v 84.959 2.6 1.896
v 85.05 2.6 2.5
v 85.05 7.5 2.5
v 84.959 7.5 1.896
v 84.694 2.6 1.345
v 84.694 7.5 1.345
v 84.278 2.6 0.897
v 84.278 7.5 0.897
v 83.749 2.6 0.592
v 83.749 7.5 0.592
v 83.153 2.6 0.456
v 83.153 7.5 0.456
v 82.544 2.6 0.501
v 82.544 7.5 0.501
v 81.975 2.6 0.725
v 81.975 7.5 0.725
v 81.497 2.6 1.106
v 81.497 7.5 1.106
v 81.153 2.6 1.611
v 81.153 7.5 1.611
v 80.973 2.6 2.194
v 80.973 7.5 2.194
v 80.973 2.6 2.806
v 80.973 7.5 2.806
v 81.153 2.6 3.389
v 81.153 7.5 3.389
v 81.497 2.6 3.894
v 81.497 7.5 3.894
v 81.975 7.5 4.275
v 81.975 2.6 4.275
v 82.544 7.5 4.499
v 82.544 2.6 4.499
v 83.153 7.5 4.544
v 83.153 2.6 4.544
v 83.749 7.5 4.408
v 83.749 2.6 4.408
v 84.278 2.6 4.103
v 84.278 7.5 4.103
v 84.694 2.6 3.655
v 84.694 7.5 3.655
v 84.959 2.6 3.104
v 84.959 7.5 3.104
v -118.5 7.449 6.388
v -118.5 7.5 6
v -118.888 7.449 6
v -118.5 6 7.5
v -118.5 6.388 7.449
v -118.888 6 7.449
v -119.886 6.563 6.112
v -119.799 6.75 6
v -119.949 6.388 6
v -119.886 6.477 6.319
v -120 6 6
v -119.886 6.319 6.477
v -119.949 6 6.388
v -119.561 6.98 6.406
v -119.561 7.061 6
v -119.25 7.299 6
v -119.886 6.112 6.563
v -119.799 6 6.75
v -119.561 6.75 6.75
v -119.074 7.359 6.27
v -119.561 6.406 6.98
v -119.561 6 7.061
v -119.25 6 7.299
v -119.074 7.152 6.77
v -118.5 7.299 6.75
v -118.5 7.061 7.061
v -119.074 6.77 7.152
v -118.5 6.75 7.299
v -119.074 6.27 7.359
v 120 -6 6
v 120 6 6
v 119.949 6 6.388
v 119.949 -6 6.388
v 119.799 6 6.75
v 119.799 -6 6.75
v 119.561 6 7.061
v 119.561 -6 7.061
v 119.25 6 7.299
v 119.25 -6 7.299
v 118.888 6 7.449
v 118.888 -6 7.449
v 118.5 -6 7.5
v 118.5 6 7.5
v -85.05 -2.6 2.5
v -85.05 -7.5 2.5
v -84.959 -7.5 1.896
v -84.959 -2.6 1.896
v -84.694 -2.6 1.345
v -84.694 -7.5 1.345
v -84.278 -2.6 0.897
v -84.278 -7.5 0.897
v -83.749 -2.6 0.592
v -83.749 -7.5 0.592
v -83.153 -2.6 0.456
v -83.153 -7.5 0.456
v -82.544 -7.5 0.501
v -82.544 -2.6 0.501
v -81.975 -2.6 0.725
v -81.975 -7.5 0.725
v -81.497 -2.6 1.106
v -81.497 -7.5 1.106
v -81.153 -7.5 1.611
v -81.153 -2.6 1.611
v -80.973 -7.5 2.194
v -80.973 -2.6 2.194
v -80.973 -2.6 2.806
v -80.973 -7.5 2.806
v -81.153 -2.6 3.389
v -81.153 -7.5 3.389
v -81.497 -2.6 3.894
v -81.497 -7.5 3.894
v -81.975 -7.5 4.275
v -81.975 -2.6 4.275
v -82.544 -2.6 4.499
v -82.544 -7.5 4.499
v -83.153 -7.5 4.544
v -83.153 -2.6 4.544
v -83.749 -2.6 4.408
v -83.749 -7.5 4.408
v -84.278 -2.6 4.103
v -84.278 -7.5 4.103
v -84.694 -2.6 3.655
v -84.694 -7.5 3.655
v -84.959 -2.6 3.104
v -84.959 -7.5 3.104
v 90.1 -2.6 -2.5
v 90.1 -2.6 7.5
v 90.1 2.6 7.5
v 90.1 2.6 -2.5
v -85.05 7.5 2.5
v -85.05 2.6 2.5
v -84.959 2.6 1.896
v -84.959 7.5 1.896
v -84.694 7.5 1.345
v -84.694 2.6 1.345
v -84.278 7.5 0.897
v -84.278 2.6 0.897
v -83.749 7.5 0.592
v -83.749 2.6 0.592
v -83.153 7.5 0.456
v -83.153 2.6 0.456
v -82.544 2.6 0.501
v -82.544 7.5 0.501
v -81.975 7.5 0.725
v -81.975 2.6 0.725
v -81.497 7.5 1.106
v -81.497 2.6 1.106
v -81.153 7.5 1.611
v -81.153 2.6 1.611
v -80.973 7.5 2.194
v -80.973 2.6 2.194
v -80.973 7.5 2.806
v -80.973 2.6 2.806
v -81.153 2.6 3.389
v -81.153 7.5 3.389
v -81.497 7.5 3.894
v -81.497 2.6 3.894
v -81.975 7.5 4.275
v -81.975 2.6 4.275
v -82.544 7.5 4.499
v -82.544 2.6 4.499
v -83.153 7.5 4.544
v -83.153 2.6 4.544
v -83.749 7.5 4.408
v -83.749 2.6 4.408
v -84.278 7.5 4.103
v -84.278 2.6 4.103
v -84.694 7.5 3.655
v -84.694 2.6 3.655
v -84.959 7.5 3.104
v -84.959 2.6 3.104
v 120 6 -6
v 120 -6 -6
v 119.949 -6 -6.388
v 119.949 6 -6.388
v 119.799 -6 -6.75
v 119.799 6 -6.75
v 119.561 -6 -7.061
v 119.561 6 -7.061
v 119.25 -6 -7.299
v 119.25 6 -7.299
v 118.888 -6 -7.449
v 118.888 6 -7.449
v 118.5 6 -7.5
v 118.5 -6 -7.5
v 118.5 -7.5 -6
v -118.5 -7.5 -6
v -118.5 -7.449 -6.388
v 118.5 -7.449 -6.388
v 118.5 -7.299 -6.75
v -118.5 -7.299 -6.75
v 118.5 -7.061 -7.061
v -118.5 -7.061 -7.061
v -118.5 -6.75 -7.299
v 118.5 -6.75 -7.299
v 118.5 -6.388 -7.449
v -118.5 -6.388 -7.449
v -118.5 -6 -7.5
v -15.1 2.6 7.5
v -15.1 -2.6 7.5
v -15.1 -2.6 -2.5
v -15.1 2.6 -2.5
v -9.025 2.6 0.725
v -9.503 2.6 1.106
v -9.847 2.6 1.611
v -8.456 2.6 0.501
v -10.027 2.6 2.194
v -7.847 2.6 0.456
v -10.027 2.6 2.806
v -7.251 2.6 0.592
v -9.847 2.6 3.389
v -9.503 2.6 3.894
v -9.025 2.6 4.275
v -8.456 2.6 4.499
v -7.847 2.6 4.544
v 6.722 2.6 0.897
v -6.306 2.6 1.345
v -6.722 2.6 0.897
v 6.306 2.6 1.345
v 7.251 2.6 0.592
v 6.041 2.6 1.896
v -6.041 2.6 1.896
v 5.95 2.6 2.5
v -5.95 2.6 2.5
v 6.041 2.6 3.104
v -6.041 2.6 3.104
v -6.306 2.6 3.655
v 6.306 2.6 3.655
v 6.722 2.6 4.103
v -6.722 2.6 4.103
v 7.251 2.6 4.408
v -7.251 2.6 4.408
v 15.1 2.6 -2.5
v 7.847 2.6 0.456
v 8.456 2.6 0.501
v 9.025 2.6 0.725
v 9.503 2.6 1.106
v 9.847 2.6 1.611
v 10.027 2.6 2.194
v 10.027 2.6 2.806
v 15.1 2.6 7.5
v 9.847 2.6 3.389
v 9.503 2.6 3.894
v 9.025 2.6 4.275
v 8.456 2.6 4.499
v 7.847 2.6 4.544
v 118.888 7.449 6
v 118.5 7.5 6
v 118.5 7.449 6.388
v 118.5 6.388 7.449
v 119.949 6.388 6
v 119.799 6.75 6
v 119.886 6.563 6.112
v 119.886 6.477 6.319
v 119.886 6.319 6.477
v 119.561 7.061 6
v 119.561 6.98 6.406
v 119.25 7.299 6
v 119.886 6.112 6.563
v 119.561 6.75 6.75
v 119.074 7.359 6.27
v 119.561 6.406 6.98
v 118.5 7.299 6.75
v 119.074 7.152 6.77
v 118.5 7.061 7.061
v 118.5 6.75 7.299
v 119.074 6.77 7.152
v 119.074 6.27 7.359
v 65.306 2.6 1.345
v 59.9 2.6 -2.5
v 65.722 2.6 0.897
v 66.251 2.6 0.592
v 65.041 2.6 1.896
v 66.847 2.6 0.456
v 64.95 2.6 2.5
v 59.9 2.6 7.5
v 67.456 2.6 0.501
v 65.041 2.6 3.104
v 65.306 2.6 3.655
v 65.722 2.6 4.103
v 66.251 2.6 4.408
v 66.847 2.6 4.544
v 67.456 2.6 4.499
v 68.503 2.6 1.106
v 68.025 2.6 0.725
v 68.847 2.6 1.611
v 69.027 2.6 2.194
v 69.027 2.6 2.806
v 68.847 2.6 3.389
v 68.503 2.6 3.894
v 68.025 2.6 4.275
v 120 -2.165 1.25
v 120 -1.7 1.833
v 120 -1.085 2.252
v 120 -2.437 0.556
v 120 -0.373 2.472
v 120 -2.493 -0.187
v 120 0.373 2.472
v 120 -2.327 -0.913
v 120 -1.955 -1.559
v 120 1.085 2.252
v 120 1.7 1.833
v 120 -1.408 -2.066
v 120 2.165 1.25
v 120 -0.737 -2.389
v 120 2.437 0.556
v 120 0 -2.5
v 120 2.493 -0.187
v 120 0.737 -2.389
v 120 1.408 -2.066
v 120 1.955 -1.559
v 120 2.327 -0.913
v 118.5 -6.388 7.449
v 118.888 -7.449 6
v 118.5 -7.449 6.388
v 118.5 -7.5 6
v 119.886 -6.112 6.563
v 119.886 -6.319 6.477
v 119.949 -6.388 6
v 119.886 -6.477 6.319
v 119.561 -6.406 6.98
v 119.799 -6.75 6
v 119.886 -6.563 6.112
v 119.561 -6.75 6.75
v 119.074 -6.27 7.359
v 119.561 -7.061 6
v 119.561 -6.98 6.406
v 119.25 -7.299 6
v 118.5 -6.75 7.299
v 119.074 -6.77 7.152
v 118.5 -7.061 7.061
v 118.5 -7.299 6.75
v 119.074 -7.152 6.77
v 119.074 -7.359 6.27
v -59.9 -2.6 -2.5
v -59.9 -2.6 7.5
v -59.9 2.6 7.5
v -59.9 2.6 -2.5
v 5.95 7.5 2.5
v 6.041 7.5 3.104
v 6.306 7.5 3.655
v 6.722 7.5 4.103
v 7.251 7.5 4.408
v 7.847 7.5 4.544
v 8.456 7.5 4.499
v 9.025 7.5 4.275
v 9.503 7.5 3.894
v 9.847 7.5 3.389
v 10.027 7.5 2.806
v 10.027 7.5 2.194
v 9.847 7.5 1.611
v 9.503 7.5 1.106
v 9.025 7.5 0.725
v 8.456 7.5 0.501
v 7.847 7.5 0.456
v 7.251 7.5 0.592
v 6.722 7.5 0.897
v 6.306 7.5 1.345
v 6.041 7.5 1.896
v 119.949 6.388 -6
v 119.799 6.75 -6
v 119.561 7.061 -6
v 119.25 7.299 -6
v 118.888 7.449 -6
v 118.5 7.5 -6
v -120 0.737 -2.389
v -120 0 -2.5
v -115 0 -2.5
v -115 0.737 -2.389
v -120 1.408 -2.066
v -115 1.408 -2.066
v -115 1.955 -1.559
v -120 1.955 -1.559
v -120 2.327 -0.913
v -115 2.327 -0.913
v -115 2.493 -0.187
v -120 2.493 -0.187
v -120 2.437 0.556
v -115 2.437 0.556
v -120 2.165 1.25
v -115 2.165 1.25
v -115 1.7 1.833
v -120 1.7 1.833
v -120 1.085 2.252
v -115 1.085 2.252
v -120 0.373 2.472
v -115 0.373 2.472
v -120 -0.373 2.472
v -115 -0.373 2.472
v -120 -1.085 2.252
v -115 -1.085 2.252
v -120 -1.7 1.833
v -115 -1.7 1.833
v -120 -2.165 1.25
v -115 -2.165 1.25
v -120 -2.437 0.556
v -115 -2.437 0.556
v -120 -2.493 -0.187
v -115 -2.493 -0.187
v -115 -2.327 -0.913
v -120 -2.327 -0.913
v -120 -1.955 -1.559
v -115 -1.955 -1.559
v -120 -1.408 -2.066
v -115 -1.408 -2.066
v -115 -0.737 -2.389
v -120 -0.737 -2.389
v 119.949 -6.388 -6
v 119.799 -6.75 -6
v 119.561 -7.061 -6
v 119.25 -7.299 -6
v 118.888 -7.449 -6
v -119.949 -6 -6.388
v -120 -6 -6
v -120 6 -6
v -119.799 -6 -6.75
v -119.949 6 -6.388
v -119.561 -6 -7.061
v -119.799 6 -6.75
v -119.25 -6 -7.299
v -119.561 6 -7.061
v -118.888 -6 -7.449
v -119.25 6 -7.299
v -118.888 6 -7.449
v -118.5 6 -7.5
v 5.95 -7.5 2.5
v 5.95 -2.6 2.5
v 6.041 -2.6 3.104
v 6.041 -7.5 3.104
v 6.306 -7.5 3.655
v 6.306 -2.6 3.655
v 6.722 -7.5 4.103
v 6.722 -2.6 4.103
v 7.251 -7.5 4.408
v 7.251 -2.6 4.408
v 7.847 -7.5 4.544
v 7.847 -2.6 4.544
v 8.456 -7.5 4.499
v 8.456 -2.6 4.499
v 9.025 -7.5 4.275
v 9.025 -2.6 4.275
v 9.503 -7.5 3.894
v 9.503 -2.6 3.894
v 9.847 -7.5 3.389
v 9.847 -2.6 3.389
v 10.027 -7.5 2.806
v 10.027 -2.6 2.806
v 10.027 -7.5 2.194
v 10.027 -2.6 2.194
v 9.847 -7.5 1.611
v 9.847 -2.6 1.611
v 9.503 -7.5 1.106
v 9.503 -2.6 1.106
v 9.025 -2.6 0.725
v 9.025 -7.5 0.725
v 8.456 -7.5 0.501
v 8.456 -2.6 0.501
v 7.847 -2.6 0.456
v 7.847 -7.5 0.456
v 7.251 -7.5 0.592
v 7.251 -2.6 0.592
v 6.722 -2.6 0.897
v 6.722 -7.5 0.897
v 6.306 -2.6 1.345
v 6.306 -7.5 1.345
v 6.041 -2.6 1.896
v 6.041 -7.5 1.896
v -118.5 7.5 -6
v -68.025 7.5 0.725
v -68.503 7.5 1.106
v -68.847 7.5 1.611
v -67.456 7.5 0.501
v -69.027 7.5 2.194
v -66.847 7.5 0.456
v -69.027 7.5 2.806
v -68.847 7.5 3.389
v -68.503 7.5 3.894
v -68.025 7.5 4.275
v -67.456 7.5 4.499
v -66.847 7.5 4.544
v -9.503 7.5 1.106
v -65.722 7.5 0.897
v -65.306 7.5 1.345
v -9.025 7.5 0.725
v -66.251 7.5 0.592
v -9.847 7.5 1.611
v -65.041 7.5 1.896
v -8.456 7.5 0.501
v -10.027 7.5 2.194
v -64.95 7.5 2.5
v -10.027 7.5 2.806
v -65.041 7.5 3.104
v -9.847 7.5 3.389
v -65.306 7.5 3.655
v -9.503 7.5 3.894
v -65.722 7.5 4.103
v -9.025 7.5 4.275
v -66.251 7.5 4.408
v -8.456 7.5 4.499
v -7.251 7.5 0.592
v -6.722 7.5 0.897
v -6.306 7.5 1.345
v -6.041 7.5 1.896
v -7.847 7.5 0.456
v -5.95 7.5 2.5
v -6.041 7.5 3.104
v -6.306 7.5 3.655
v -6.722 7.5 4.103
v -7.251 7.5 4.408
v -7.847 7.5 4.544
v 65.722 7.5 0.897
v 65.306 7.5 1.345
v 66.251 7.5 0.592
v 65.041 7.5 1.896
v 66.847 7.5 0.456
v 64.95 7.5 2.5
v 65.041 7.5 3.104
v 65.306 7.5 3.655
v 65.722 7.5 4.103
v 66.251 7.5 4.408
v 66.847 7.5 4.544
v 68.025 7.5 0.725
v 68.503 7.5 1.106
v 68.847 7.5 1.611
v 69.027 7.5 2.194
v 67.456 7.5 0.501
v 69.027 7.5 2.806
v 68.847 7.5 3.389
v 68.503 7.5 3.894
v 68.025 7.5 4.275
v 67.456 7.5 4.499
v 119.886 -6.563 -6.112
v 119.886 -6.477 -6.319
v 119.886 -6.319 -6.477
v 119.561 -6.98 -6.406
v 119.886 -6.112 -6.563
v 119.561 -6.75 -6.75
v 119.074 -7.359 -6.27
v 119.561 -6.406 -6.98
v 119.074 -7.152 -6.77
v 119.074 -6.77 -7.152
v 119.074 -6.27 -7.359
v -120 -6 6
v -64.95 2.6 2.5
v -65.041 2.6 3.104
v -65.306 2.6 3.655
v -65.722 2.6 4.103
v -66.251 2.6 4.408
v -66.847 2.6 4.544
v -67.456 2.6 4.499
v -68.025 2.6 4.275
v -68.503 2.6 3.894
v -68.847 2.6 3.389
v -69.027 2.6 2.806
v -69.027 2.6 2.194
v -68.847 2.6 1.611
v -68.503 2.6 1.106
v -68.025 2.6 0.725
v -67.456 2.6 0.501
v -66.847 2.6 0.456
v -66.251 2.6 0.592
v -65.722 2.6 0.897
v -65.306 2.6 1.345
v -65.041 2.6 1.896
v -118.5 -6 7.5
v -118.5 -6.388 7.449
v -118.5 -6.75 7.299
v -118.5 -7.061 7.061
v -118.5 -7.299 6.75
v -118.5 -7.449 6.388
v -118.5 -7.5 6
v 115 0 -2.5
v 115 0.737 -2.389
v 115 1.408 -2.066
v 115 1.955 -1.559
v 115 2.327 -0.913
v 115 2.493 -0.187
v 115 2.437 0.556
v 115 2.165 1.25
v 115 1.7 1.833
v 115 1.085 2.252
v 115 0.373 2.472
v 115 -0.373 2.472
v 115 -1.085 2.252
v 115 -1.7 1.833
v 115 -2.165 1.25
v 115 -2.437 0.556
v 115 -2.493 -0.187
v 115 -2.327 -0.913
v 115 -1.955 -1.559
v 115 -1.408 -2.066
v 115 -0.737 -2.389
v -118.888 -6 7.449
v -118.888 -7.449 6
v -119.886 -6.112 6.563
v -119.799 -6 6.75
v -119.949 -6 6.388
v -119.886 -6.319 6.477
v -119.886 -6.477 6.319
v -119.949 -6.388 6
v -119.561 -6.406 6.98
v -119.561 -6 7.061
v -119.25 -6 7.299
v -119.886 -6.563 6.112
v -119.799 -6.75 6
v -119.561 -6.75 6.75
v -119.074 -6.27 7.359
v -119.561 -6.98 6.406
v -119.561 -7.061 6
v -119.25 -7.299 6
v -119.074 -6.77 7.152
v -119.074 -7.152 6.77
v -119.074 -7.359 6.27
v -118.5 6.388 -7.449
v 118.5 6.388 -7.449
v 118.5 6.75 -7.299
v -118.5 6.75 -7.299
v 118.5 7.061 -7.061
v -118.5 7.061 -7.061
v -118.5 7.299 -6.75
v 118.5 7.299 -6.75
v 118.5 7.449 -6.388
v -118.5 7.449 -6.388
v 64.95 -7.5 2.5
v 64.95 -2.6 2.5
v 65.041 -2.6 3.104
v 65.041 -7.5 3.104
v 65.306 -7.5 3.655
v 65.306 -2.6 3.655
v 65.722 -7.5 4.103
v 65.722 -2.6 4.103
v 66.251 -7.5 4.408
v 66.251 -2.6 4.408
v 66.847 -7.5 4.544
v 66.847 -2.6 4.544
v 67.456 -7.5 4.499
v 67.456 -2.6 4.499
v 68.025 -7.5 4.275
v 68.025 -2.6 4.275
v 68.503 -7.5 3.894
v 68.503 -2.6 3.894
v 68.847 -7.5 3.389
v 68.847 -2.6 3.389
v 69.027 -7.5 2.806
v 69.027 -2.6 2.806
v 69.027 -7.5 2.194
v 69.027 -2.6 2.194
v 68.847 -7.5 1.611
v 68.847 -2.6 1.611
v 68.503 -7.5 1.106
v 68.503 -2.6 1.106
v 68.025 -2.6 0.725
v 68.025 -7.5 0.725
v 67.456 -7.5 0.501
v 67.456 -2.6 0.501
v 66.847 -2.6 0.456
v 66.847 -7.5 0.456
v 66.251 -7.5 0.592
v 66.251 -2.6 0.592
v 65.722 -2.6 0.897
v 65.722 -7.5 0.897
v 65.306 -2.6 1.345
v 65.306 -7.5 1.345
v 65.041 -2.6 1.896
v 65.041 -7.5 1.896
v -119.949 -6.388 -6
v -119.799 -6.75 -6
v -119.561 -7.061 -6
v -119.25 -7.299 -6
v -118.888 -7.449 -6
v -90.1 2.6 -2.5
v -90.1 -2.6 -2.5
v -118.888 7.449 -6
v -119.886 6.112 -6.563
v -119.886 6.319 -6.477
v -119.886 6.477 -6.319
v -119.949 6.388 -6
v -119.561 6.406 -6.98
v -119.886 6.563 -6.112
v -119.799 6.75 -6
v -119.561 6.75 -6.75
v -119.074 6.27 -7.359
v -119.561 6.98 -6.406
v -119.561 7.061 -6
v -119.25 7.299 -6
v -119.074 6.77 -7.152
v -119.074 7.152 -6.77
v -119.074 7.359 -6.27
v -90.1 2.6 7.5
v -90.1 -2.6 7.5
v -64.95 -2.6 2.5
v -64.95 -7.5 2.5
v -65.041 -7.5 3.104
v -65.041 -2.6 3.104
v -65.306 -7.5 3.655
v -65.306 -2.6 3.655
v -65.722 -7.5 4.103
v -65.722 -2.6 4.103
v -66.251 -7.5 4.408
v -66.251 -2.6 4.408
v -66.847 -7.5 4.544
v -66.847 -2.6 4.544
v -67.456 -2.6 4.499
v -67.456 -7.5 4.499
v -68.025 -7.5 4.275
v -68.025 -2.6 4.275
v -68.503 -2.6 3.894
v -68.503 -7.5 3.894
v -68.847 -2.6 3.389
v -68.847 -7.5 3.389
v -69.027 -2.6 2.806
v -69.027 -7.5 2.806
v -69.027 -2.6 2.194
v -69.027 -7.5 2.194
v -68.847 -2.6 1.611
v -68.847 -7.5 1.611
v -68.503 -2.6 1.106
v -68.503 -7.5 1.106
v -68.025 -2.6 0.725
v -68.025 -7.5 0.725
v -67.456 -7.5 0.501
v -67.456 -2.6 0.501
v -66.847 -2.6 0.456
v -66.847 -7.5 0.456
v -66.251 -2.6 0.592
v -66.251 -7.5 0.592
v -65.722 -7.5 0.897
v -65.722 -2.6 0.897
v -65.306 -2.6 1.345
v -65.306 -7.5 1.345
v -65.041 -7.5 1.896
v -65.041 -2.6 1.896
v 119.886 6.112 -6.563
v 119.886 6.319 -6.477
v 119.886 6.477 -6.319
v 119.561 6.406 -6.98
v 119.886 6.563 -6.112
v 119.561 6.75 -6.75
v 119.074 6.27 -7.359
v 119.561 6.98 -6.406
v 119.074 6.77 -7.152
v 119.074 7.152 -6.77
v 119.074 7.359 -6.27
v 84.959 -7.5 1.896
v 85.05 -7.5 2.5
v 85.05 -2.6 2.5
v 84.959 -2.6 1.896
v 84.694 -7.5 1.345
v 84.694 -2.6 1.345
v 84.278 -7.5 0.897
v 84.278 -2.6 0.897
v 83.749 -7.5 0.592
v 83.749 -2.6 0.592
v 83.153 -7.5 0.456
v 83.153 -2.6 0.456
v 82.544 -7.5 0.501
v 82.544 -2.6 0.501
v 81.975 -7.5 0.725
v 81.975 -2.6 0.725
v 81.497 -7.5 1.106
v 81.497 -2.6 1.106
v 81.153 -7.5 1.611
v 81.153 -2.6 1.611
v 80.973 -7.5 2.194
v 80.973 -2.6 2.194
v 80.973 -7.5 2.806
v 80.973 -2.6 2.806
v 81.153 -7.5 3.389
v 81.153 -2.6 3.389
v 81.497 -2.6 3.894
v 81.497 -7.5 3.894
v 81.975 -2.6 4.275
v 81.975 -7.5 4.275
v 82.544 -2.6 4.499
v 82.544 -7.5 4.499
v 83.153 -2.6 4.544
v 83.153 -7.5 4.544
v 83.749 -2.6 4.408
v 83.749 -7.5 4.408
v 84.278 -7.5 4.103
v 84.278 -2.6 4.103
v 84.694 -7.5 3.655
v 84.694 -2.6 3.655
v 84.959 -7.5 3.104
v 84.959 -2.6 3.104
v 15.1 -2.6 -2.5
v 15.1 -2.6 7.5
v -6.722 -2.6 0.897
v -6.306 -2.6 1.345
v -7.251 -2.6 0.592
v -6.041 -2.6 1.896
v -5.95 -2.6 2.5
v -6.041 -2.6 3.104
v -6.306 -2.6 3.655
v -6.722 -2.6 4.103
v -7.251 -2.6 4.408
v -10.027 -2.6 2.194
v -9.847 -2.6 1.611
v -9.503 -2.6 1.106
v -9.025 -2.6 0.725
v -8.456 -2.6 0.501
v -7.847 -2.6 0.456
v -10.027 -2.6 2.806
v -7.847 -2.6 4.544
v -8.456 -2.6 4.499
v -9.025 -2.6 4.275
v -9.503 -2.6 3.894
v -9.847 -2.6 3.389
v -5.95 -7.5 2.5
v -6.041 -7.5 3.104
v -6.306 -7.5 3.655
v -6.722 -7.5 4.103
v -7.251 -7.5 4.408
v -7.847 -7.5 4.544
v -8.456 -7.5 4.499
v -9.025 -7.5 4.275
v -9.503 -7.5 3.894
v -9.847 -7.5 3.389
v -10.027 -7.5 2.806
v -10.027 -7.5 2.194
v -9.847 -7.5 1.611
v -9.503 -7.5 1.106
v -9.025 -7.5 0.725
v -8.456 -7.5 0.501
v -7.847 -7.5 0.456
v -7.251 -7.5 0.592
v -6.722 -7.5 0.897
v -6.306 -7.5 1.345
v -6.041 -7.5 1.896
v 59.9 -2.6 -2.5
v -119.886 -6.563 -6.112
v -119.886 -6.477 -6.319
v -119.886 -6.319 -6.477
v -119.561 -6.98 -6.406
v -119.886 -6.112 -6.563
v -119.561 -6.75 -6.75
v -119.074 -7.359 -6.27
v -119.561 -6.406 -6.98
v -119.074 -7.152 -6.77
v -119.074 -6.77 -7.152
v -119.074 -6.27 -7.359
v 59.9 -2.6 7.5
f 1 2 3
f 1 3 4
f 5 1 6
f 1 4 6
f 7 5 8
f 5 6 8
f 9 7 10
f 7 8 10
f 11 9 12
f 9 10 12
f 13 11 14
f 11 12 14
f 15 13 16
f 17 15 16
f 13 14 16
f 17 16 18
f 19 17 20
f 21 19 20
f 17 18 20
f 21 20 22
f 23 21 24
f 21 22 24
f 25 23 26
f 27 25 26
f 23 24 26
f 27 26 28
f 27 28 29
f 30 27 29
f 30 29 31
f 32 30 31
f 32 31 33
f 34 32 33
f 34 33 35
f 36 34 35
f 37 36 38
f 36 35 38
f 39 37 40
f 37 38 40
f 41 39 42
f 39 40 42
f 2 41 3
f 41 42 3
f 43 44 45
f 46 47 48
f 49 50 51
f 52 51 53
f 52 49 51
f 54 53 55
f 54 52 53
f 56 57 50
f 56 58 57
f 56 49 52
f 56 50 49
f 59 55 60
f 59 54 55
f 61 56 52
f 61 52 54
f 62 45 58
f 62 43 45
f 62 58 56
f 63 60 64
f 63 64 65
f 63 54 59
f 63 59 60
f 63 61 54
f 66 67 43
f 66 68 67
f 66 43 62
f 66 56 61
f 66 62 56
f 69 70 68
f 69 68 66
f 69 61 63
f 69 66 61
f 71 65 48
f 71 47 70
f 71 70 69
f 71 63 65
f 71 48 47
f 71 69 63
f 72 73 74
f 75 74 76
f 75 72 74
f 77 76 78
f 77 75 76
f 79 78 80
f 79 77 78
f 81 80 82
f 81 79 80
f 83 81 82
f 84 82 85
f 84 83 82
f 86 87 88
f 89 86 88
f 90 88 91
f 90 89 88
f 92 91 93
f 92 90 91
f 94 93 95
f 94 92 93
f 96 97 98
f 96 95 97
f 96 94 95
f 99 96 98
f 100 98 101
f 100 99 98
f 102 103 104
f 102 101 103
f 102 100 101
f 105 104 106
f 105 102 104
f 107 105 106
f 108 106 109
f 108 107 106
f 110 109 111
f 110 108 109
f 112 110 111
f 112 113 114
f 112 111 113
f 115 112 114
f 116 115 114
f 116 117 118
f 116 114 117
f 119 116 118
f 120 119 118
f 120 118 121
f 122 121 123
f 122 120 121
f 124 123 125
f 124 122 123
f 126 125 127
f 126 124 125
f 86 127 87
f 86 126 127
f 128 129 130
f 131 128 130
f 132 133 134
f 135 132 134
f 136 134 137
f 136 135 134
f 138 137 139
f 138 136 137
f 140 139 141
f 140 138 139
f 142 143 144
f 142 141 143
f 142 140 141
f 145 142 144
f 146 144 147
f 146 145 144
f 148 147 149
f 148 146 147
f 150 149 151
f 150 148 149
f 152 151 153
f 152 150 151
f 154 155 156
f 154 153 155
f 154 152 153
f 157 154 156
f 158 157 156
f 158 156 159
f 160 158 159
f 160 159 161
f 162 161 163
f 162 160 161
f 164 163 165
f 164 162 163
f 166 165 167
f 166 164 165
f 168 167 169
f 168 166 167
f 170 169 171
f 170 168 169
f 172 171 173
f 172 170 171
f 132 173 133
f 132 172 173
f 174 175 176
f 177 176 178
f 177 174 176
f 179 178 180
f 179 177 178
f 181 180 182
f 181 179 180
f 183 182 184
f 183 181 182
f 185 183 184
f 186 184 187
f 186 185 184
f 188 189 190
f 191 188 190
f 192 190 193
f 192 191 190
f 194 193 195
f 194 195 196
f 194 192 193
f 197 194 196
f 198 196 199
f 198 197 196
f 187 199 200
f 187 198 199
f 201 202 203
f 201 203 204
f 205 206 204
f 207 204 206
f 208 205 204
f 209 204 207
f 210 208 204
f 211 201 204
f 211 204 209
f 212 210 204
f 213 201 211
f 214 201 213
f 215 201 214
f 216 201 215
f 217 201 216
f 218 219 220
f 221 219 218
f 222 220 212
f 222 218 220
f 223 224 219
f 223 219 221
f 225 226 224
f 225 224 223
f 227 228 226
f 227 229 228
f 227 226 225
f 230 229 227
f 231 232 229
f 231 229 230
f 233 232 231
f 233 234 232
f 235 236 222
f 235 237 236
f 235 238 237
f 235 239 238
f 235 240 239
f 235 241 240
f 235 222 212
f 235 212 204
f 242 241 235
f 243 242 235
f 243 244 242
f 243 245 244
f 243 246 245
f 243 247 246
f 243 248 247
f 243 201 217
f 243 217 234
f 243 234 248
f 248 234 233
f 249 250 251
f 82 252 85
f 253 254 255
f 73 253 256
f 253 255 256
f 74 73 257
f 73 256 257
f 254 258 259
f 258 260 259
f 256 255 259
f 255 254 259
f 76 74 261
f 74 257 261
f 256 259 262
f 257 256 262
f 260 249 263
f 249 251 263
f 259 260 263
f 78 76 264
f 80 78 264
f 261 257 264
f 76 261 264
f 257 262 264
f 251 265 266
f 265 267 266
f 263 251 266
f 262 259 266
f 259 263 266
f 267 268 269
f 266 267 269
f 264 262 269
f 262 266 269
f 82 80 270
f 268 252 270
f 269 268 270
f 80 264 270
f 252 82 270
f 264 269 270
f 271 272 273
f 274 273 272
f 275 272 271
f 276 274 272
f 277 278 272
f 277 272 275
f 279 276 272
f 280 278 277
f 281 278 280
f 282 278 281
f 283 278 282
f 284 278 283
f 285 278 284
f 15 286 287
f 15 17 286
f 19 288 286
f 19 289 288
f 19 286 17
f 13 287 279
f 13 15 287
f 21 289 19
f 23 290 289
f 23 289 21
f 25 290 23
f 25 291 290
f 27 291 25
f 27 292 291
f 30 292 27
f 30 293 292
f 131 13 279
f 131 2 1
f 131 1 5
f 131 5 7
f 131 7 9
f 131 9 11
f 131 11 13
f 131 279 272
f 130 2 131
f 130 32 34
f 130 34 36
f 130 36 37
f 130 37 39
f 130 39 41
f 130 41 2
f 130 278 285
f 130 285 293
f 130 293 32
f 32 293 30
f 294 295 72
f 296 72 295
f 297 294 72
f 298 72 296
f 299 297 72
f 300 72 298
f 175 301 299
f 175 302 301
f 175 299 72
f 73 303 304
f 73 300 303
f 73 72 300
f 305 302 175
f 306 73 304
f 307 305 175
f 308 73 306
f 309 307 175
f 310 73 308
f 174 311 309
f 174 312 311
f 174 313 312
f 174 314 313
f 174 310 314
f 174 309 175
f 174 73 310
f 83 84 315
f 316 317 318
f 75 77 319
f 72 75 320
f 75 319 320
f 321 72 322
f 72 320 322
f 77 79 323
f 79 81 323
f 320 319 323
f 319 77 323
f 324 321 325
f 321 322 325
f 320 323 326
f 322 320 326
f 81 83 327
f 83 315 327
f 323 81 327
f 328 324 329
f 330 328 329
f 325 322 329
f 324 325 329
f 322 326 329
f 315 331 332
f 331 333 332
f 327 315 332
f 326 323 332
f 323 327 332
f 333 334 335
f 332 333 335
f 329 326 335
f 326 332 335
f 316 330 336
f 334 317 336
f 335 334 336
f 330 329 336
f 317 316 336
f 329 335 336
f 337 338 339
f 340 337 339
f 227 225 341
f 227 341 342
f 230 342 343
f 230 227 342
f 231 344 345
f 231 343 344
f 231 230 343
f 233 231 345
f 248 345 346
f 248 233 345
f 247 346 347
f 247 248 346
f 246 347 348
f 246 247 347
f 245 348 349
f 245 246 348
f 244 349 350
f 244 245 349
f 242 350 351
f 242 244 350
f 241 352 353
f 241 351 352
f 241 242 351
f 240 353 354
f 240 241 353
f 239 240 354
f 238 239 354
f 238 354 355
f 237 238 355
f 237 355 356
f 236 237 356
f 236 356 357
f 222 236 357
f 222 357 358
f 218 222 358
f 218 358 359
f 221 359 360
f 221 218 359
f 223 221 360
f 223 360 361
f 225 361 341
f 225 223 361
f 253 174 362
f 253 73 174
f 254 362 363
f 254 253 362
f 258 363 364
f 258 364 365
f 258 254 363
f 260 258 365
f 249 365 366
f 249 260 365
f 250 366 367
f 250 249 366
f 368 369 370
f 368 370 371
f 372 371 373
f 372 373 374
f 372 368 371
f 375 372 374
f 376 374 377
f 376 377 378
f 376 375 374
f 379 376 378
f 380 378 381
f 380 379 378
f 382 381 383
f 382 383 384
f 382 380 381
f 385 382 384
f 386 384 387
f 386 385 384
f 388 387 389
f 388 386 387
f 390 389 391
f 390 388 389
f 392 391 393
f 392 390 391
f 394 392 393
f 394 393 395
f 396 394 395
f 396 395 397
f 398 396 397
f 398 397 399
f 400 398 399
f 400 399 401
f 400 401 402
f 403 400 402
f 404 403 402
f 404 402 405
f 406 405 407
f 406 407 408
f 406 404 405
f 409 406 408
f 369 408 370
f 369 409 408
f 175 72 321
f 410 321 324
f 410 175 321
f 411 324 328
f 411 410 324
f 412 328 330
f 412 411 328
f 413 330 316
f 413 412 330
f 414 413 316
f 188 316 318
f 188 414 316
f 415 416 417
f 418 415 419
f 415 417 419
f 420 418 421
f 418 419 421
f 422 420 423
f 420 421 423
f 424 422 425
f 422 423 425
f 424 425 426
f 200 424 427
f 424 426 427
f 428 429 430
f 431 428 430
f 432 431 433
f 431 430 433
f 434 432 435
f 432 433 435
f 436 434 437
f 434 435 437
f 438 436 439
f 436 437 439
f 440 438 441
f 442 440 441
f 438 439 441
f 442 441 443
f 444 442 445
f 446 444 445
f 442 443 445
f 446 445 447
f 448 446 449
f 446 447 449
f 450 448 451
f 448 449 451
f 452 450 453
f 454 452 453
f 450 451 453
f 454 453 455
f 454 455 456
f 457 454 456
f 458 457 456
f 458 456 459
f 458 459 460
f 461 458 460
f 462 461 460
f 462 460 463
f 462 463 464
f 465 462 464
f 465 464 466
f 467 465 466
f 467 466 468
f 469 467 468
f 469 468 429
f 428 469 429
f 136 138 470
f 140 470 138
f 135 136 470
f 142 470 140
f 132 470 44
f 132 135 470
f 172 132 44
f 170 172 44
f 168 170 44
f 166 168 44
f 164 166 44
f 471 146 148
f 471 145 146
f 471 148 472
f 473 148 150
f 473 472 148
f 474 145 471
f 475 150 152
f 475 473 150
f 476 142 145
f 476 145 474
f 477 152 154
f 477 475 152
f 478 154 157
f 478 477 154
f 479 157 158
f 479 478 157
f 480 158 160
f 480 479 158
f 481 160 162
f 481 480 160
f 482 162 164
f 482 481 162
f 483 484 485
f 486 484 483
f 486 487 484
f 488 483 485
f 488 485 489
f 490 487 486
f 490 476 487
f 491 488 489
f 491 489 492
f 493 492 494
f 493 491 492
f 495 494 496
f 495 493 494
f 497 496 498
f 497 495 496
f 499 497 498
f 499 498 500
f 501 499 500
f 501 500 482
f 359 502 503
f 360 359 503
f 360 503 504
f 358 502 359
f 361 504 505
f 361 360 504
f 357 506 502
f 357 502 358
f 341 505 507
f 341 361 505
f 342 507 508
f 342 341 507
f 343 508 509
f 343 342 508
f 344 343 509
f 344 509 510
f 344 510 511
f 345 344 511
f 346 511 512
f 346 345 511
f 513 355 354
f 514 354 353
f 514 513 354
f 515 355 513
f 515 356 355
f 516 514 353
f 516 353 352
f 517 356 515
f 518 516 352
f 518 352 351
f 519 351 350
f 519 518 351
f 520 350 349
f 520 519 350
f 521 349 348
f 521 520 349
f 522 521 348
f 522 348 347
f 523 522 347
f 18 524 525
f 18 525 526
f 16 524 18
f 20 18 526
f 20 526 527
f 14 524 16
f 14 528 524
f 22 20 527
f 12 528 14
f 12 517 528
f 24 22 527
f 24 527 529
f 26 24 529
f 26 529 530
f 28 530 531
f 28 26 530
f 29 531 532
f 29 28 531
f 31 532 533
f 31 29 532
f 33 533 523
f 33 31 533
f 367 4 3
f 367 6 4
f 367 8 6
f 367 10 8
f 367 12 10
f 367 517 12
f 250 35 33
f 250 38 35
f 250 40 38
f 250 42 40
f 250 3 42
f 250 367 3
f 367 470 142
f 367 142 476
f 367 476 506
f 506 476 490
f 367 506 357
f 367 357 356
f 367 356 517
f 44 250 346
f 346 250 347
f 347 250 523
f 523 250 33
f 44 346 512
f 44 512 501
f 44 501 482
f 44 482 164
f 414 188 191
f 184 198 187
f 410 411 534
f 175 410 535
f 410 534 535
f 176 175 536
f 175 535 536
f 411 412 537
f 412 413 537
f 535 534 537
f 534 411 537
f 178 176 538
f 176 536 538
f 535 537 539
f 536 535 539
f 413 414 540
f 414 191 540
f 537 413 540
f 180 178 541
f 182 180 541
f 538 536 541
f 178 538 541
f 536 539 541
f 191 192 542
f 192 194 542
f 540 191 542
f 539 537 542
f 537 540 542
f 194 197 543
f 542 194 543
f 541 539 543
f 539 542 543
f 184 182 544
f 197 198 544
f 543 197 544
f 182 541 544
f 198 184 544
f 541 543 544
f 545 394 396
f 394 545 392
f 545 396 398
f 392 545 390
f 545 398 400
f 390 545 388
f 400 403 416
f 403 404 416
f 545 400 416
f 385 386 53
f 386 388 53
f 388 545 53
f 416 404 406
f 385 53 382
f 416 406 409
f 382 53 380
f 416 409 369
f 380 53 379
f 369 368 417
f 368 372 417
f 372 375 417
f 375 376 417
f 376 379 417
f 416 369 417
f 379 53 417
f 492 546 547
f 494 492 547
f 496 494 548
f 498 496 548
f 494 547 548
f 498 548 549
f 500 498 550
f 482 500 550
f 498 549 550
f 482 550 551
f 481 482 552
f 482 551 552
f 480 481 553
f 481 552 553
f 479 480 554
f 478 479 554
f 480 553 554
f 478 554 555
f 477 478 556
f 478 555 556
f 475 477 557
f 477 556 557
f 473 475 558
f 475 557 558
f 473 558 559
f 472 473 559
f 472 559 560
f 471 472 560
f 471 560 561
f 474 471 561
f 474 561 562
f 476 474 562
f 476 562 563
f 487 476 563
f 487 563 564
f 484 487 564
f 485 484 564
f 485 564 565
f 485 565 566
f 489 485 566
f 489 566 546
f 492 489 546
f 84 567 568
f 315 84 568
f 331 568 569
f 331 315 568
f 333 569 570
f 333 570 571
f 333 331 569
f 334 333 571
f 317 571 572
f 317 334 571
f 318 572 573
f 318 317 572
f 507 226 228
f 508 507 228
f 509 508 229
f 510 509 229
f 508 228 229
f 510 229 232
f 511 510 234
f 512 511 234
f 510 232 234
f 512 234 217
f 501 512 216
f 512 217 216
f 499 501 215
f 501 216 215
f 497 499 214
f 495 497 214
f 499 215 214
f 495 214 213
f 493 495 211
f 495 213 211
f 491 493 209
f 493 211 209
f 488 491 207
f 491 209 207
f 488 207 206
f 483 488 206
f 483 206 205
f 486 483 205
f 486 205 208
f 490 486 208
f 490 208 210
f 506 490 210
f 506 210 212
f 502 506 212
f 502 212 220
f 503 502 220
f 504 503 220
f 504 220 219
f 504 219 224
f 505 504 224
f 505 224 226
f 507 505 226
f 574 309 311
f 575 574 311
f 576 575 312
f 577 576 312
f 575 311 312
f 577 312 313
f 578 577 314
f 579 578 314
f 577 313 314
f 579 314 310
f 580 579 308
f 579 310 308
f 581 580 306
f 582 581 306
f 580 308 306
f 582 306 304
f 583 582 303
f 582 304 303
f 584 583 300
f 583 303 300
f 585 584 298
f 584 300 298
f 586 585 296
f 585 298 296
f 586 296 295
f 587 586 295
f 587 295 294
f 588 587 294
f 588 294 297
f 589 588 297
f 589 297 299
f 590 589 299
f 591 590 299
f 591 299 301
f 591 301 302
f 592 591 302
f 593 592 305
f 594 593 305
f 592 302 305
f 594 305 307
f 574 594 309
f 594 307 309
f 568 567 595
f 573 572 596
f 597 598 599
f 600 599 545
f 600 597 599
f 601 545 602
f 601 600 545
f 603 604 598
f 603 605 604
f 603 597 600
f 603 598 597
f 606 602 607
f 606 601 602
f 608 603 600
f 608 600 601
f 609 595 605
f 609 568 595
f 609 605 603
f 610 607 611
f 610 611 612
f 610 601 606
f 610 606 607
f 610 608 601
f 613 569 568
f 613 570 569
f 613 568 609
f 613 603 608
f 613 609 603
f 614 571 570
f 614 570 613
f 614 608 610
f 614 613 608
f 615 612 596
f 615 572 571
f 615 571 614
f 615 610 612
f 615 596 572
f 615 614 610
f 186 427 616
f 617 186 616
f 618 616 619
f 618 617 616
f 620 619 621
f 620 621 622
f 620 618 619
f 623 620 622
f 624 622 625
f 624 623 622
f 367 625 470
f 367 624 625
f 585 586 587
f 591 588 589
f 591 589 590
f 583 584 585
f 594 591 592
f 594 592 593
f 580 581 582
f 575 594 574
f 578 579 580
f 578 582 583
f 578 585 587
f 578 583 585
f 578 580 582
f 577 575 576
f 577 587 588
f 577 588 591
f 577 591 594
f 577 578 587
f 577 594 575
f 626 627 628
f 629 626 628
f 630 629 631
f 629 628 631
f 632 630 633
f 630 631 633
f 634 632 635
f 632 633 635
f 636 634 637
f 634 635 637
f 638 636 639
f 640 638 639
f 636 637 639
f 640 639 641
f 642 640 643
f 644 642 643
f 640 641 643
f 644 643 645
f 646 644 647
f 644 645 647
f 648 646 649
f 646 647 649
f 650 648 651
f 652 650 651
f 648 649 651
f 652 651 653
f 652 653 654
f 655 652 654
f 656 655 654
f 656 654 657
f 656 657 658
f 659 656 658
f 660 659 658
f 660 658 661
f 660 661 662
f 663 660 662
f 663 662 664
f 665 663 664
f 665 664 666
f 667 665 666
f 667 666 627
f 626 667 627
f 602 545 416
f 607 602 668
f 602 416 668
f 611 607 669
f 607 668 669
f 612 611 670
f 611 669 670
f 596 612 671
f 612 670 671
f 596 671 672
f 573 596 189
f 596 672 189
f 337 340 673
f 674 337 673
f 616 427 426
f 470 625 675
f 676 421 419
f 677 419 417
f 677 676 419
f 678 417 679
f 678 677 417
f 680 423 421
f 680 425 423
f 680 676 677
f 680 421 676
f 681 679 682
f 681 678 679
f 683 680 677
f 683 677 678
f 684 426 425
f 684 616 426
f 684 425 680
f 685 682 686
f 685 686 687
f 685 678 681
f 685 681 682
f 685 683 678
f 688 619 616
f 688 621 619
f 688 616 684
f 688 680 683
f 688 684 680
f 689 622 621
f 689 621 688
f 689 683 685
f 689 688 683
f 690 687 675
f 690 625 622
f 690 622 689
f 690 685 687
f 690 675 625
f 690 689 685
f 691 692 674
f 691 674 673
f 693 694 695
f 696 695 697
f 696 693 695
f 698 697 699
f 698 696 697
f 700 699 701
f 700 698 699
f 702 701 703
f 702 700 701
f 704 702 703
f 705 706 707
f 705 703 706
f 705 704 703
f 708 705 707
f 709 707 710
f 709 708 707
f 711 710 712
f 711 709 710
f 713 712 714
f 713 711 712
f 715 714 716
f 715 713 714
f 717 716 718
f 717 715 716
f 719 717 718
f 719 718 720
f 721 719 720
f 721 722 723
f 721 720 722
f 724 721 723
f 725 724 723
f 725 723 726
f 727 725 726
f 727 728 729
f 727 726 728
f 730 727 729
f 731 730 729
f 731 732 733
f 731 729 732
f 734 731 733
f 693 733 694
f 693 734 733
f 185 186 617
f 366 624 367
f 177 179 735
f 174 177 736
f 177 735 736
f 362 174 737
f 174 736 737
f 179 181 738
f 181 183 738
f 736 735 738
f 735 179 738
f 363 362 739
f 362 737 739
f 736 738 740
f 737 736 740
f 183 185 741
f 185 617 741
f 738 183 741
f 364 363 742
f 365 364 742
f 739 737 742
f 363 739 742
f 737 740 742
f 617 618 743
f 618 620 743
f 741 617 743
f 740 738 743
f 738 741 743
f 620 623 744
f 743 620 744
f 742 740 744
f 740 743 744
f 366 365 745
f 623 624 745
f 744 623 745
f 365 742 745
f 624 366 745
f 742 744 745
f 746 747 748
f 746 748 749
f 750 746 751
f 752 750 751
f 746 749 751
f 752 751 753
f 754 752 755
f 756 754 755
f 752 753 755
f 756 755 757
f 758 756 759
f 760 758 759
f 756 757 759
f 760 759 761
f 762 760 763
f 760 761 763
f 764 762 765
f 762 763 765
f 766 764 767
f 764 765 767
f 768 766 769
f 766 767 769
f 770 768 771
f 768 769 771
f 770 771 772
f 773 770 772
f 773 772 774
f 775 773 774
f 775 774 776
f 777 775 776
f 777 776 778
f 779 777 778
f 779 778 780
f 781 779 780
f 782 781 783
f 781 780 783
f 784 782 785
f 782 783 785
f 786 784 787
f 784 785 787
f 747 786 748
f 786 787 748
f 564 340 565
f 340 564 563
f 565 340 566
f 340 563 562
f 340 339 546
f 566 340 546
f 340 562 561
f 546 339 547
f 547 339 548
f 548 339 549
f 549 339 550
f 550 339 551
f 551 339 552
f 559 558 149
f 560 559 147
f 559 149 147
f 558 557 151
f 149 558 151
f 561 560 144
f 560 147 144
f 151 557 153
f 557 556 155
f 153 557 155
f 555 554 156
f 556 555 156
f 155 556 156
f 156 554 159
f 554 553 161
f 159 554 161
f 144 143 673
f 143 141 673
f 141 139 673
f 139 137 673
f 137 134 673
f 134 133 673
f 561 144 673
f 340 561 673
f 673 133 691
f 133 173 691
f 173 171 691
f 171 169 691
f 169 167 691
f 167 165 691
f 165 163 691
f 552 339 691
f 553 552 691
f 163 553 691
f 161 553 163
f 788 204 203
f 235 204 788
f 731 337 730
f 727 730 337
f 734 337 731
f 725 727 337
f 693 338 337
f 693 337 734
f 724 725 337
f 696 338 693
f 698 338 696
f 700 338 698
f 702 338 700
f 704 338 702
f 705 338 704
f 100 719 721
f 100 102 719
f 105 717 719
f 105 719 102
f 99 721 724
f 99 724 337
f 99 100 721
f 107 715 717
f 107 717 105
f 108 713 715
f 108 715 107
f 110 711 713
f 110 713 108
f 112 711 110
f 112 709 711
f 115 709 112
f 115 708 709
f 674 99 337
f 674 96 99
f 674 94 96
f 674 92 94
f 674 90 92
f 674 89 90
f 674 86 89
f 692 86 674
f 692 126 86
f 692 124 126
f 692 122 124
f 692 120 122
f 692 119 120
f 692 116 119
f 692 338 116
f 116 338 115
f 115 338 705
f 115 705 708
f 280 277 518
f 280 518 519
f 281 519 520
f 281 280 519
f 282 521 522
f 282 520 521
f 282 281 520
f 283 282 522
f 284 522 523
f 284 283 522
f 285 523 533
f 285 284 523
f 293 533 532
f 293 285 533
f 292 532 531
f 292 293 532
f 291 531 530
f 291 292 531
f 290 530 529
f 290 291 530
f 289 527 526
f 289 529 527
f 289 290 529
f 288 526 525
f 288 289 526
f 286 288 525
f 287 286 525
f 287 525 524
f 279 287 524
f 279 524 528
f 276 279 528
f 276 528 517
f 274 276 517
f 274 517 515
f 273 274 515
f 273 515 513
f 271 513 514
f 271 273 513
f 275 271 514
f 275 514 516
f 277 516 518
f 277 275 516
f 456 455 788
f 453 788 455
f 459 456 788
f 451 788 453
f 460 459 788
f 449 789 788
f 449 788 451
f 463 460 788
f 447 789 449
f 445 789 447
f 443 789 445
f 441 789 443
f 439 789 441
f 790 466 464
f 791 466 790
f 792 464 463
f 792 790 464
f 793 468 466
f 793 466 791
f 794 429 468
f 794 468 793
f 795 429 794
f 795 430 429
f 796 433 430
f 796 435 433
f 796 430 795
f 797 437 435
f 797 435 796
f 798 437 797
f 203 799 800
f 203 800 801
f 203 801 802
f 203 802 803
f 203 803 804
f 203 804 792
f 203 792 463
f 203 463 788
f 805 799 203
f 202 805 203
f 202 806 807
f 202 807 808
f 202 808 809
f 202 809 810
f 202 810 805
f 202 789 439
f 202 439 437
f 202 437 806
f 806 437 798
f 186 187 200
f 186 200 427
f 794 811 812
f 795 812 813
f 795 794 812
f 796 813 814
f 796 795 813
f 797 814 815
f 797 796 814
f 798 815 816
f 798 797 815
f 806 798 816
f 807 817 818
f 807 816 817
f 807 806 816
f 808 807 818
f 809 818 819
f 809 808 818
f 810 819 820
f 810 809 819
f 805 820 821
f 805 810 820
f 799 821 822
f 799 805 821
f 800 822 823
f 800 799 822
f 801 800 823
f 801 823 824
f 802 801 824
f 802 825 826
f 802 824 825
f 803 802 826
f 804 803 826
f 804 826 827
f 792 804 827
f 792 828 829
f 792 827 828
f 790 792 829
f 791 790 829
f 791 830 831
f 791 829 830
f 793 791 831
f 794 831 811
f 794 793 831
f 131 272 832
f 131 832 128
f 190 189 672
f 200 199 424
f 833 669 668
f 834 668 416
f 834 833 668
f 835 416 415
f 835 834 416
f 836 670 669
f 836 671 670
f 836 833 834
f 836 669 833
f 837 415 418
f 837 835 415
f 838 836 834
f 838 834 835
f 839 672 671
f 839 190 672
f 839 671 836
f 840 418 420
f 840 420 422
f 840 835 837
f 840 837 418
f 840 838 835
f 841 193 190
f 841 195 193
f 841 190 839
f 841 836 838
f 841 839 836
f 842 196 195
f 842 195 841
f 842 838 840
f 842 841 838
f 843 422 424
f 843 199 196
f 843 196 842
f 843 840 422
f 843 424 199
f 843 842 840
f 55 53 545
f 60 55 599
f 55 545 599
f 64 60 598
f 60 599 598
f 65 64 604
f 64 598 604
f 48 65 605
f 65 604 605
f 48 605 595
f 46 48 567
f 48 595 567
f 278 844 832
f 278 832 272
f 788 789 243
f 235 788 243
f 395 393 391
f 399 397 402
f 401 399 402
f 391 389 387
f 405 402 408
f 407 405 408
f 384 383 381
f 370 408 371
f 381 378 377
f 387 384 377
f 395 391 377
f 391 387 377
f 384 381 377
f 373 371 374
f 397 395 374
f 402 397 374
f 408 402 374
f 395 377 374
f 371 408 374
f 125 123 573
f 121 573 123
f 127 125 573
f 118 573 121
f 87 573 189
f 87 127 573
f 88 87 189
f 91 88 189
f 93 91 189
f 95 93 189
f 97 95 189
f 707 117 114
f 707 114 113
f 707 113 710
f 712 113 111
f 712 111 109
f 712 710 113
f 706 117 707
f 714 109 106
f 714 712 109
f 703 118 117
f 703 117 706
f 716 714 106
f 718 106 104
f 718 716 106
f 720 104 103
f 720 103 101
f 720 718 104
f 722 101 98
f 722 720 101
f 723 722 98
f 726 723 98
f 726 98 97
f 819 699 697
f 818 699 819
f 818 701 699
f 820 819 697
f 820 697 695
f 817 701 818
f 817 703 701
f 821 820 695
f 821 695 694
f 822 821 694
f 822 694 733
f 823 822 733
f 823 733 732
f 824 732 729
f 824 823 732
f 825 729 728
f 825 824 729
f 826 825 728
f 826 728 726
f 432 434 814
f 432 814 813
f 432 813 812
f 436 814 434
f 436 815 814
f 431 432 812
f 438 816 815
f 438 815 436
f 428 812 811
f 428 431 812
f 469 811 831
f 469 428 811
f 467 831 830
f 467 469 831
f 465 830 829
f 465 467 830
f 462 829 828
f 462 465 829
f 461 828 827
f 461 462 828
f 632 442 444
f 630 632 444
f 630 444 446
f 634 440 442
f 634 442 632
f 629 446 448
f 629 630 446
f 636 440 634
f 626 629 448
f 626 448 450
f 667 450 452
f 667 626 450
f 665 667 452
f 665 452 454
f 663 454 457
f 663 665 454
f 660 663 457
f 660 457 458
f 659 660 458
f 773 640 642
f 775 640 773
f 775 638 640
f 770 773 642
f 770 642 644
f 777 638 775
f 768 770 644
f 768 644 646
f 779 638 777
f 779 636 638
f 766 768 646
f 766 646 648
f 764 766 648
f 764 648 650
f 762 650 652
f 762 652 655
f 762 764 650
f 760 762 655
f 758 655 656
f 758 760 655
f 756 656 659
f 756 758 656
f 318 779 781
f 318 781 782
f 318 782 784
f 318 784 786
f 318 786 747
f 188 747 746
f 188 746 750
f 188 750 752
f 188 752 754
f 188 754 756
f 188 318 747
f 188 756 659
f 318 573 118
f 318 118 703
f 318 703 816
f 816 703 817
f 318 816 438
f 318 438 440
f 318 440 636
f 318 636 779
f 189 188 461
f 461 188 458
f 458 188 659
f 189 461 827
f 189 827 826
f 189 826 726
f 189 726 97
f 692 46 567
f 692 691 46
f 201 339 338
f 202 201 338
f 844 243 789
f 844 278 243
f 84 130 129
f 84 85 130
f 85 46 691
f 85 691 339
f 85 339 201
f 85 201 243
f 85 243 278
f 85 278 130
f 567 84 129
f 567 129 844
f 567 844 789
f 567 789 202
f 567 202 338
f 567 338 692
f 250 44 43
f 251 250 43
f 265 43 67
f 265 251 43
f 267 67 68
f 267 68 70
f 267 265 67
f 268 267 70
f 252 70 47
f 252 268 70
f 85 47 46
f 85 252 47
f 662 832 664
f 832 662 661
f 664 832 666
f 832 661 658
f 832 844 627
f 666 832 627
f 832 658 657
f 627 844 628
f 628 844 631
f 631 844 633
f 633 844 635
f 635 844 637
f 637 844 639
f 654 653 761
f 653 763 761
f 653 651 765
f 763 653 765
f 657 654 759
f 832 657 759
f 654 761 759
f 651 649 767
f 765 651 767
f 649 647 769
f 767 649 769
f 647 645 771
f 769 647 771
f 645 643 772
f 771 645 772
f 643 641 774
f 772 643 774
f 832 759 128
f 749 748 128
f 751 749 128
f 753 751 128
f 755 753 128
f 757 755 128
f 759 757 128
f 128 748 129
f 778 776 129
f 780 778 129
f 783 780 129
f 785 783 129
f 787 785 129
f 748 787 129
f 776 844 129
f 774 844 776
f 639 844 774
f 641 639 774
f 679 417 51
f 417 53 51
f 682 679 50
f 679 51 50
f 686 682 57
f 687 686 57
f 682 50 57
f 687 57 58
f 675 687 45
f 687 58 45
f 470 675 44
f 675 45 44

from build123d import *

# Parameters (mm, degrees)
BOSS_EXTRU_1_DEPTH      = 120
ESQUISSE2_W             = 30.2
ESQUISSE2_H             = 5.2
ENL_V_MAT_EXTRU_1_DEPTH = 10
ESQUISSE3_R             = 2.05
ENL_V_MAT_EXTRU_2_DEPTH = 121.657614762
CONG_2_R                = 1.5
ESQUISSE4_R             = 2.5
ENL_V_MAT_EXTRU_3_DEPTH = 5
CONG_2_OF_SYM_TRIE6_R   = 1.5


with BuildPart() as part:
    # Esquisse1 → Boss.-Extru.1 (new body)
    with BuildSketch(Plane(origin=(0, 0, 0), x_dir=(0, 0, -1), z_dir=(1, 0, 0))):
        with BuildLine():
            Line((6, 7.5), (-6, 7.5))
            ThreePointArc((-6, 7.5), (-7.060660172, 7.060660172), (-7.5, 6))
            Line((-7.5, 6), (-7.5, -6))
            ThreePointArc((-7.5, -6), (-7.060660172, -7.060660172), (-6, -7.5))
            Line((-6, -7.5), (6, -7.5))
            ThreePointArc((6, -7.5), (7.060660172, -7.060660172), (7.5, -6))
            Line((7.5, -6), (7.5, 6))
            ThreePointArc((7.5, 6), (7.060660172, 7.060660172), (6, 7.5))
        make_face()
    boss_extru_1 = extrude(amount=BOSS_EXTRU_1_DEPTH)

    # Esquisse2 → Enlèv. mat.-Extru.1 (cut)
    with BuildSketch(Plane.XY.offset(7.5)):
        Rectangle(ESQUISSE2_W, ESQUISSE2_H)
        with Locations((75, 0)):
            Rectangle(ESQUISSE2_W, ESQUISSE2_H)
    enl_v_mat_extru_1 = extrude(amount=-ENL_V_MAT_EXTRU_1_DEPTH, mode=Mode.SUBTRACT)

    # Esquisse3 → Enlèv. mat.-Extru.2 (cut, symmetric)
    with BuildSketch(Plane(origin=(0, -2.6, 0), x_dir=(1, 0, 0), z_dir=(0, 1, 0))):
        with Locations(Location((8, -2.5, 0), (0, 0, 180))):
            Circle(ESQUISSE3_R)
        with Locations(Location((67, -2.5, 0), (0, 0, 180))):
            Circle(ESQUISSE3_R)
        with Locations((83, -2.5)):
            Circle(ESQUISSE3_R)
    enl_v_mat_extru_2 = extrude(amount=ENL_V_MAT_EXTRU_2_DEPTH, both=True, mode=Mode.SUBTRACT)

    # Congé2
    cong_2_edges = [part.edges().sort_by_distance(p)[0] for p in [
        (120, 7.060660172, 7.060660172),
        (120, 0, 7.5),
        (120, -7.060660172, 7.060660172),
        (120, -7.5, 0),
        (120, -7.060660172, -7.060660172),
        (120, 0, -7.5),
        (120, 7.060660172, -7.060660172),
        (120, 7.5, 0),
    ]]
    fillet(cong_2_edges, radius=CONG_2_R)

    # Esquisse4 → Enlèv. mat.-Extru.3 (cut)
    with BuildSketch(Plane(origin=(120, 0, 0), x_dir=(0, 0, -1), z_dir=(1, 0, 0))):
        Circle(ESQUISSE4_R)
    enl_v_mat_extru_3 = extrude(amount=-ENL_V_MAT_EXTRU_3_DEPTH, mode=Mode.SUBTRACT)

    # Symétrie6: Boss.-Extru.1, Enlèv. mat.-Extru.1, Enlèv. mat.-Extru.2, Enlèv. mat.-Extru.3 across plane
    add(boss_extru_1.mirror(Plane(origin=(0, 6, -6), x_dir=(0, 0, 1), z_dir=(-1, 0, 0))))
    add(enl_v_mat_extru_1.mirror(Plane(origin=(0, 6, -6), x_dir=(0, 0, 1), z_dir=(-1, 0, 0))), mode=Mode.SUBTRACT)
    add(enl_v_mat_extru_2.mirror(Plane(origin=(0, 6, -6), x_dir=(0, 0, 1), z_dir=(-1, 0, 0))), mode=Mode.SUBTRACT)
    add(enl_v_mat_extru_3.mirror(Plane(origin=(0, 6, -6), x_dir=(0, 0, 1), z_dir=(-1, 0, 0))), mode=Mode.SUBTRACT)

    # Congé2 of Symétrie6
    cong_2_of_sym_trie6_edges = [part.edges().sort_by_distance(p)[0] for p in [
        (-120, 7.060660172, 7.060660172),
        (-120, 0, 7.5),
        (-120, -7.060660172, 7.060660172),
        (-120, -7.5, 0),
        (-120, -7.060660172, -7.060660172),
        (-120, 0, -7.5),
        (-120, 7.060660172, -7.060660172),
        (-120, 7.5, 0),
    ]]
    fillet(cong_2_of_sym_trie6_edges, radius=CONG_2_OF_SYM_TRIE6_R)


solid = part.part
